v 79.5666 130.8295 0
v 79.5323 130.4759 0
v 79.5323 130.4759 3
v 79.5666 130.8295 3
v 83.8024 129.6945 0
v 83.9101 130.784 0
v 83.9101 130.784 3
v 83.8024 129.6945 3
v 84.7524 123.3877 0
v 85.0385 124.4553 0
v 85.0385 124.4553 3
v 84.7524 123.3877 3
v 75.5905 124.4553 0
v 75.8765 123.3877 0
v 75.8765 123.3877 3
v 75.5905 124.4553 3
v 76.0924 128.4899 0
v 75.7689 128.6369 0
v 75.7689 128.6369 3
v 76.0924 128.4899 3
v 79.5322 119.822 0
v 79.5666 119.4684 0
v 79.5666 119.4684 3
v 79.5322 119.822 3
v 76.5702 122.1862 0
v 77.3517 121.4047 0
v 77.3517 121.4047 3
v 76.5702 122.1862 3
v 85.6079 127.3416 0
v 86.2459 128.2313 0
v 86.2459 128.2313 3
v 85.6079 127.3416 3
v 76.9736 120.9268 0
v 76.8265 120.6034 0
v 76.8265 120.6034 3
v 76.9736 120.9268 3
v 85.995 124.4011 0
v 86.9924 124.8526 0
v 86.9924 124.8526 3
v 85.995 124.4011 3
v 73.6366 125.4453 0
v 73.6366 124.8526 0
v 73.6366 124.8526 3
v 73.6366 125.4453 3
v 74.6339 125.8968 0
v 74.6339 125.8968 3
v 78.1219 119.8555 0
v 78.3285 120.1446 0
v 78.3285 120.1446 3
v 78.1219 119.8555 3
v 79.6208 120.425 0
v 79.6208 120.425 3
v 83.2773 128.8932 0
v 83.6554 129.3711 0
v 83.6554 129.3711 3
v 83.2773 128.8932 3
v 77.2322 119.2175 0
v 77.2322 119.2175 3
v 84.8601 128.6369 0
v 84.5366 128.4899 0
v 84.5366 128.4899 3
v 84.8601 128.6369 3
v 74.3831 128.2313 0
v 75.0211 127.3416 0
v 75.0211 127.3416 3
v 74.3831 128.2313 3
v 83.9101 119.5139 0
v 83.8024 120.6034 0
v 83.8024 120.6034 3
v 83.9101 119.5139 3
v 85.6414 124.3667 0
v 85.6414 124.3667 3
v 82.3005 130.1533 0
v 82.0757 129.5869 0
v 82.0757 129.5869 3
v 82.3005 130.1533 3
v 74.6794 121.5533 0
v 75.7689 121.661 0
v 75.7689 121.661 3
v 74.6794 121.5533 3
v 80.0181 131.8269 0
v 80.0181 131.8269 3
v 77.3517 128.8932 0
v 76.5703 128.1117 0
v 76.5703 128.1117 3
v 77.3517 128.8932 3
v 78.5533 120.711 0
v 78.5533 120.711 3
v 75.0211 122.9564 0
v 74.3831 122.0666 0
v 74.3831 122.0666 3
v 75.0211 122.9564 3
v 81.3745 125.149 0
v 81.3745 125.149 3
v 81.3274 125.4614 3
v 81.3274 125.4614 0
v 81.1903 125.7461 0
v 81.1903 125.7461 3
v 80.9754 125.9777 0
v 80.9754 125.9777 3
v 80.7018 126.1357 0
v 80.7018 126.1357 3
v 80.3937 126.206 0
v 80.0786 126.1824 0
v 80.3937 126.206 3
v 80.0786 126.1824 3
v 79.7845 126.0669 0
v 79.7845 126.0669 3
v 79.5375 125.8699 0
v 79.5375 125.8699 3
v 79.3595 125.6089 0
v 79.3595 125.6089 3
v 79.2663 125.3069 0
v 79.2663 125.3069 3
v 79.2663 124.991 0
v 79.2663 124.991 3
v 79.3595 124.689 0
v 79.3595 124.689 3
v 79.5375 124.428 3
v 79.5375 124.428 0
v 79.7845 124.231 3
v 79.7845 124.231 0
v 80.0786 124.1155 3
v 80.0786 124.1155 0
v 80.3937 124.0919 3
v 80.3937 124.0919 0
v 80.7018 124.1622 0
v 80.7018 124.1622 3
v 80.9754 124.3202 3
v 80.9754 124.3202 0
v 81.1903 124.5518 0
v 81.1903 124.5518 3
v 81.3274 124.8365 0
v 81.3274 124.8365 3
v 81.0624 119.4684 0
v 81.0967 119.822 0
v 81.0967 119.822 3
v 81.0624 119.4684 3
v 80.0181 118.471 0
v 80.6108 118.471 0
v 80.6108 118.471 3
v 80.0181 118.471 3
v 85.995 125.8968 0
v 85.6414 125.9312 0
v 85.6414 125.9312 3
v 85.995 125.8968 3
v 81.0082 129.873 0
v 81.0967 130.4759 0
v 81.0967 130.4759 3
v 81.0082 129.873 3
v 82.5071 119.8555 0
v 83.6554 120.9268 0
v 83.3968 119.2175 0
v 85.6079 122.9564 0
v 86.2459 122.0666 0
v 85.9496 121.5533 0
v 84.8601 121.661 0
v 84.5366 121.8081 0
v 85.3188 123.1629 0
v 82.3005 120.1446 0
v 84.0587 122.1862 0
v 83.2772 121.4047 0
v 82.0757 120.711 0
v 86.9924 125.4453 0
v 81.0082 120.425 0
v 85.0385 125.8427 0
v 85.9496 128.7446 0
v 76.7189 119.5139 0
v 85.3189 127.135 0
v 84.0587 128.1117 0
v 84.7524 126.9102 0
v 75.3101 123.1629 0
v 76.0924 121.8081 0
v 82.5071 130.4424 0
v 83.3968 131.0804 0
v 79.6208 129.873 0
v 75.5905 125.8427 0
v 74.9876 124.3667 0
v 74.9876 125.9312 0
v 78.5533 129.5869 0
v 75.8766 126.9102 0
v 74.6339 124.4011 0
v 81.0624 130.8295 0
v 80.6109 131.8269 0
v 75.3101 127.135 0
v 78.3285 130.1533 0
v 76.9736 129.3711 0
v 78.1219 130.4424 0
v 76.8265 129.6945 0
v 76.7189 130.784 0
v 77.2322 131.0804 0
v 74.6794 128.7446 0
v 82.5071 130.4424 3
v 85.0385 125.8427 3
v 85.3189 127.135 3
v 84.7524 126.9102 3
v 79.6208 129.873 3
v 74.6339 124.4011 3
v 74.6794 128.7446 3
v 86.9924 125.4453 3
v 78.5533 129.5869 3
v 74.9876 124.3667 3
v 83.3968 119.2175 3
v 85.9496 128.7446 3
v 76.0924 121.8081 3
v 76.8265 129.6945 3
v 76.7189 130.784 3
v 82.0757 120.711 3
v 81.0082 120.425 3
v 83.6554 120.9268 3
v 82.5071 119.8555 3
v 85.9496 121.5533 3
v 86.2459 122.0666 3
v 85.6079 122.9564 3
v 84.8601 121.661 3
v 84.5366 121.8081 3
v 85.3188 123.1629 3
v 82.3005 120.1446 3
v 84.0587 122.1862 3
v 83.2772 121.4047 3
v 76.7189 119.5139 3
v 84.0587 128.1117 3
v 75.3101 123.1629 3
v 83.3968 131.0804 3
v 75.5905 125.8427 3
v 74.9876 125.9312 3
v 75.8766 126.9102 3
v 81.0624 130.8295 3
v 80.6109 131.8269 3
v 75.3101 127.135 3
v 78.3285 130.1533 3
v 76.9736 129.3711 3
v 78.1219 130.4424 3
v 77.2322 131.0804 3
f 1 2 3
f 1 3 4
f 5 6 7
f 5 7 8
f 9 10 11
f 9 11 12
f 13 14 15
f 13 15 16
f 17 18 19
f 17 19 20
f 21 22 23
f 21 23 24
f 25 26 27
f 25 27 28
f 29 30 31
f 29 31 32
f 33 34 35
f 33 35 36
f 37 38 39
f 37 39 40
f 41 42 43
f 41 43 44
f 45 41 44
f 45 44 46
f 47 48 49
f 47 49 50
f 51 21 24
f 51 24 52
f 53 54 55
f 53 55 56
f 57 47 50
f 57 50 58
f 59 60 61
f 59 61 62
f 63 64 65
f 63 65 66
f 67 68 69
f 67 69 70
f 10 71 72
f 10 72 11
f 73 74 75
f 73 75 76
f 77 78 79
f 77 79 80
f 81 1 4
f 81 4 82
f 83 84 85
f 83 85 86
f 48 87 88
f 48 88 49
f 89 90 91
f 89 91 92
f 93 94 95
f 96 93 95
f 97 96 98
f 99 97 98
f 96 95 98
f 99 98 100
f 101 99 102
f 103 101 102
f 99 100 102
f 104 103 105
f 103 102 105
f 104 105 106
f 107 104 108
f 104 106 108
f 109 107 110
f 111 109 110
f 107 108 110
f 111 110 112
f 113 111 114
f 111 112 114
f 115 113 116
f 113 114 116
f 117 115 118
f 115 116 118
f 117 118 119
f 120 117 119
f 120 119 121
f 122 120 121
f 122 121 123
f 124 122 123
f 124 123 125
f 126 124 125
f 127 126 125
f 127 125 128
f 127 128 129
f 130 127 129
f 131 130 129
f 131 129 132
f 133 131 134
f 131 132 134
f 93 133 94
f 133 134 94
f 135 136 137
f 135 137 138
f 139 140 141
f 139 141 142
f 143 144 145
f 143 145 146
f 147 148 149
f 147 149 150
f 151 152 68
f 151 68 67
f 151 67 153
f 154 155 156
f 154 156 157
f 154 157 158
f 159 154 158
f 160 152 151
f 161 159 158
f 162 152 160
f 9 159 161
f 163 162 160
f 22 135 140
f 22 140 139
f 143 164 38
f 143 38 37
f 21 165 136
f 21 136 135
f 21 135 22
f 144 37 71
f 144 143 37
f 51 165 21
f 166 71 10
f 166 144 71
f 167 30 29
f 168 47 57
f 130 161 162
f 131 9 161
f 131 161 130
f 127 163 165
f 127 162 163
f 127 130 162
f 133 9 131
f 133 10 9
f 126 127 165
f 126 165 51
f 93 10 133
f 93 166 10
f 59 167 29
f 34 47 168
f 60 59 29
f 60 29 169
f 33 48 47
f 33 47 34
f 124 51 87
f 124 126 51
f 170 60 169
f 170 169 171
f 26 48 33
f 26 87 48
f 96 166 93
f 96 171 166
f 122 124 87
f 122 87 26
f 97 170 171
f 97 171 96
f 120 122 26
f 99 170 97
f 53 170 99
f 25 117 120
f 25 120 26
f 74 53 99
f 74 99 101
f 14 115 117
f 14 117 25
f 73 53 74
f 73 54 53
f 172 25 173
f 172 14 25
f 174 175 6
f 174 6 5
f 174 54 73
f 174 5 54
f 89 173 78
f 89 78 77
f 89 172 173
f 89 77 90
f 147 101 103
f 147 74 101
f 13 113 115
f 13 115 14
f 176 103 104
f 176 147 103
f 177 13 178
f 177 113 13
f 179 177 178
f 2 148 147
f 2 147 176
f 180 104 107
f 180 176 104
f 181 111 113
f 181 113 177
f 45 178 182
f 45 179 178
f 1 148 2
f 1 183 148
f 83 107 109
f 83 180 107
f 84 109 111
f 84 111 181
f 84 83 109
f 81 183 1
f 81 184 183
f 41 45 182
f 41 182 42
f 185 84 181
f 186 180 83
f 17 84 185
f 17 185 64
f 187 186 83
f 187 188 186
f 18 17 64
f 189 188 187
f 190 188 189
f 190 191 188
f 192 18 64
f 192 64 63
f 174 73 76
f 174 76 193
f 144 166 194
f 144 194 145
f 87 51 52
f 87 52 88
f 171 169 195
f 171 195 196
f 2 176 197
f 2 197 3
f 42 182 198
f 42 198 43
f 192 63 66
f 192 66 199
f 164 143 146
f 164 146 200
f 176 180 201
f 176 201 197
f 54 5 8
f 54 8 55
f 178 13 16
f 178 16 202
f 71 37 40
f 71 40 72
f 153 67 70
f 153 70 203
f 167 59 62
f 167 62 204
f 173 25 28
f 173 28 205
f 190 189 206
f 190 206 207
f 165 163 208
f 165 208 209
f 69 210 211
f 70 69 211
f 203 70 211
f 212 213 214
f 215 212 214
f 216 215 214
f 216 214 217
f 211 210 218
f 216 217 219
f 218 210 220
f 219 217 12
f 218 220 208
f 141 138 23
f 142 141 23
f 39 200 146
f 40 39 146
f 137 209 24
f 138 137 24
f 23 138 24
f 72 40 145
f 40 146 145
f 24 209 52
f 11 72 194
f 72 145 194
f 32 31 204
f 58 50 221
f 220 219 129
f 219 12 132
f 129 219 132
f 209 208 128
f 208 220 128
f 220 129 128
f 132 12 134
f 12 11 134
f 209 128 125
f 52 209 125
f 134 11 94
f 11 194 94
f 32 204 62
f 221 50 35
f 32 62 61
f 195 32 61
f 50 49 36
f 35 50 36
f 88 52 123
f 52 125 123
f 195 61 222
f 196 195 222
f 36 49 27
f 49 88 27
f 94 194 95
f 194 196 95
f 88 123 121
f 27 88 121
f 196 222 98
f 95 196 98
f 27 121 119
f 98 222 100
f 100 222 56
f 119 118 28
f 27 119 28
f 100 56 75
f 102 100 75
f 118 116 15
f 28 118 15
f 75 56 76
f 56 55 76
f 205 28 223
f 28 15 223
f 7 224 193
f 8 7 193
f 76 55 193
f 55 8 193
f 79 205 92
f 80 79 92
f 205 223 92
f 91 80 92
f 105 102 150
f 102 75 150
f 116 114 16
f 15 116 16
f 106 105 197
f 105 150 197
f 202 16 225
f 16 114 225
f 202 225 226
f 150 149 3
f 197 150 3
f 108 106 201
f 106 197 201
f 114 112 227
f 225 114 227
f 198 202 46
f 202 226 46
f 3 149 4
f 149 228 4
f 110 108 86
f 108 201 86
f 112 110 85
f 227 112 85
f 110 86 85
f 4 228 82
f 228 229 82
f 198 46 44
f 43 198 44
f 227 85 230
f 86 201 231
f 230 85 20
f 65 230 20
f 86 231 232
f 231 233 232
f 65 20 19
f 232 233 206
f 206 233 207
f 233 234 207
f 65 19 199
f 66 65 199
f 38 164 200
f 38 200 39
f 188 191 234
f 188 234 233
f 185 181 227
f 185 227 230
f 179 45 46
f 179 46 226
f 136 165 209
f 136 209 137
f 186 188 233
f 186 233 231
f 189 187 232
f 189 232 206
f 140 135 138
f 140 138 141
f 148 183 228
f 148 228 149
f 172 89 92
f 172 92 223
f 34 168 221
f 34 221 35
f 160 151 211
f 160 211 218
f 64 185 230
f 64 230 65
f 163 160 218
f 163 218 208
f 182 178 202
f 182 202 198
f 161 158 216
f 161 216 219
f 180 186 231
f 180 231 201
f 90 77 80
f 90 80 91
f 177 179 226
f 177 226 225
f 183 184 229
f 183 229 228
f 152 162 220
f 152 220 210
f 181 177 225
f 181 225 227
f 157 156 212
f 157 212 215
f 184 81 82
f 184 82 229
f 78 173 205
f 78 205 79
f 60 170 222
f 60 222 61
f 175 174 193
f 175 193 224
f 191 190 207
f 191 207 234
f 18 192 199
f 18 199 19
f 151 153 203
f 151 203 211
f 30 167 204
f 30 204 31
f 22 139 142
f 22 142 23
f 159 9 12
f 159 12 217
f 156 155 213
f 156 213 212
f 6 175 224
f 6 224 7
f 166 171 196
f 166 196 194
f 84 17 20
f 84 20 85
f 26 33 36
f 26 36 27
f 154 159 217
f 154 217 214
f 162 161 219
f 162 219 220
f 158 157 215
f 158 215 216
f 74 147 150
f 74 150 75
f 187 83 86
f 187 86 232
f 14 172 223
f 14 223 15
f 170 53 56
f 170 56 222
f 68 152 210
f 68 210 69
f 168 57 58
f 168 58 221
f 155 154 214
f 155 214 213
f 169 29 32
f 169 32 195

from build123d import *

# Parameters (mm, degrees)
BOSS_EXTRUDE1_DEPTH = 3
SKETCH2_R           = 1.06
CUT_EXTRUDE1_DEPTH  = 3


with BuildPart() as part:
    # Model → Boss-Extrude1 (new body)
    with BuildSketch(Plane.XY):
        Polygon((85.038482334, 125.842661122), (85.641402334, 125.931201122), (85.995047634, 125.896821579), (86.992422179, 125.445319522), (86.992422179, 124.852599522), (85.995047634, 124.401097464), (85.641402334, 124.366717921), (85.038482334, 124.455257921), (84.752432117, 123.387727108), (85.31884426, 123.162940226), (85.607924576, 122.95635), (86.245924576, 122.06665), (85.949564326, 121.553339567), (84.86006114, 121.661009882), (84.536608908, 121.80806635), (84.058733602, 122.186202635), (83.277245674, 121.404714707), (83.65538196, 120.926839402), (83.802438428, 120.60338717), (83.910108743, 119.513883983), (83.39679831, 119.217523733), (82.50709831, 119.855523733), (82.300508083, 120.14460405), (82.075721201, 120.711016193), (81.008190388, 120.424965975), (81.096730388, 119.822045975), (81.062350845, 119.468400675), (80.610848788, 118.471026131), (80.018128788, 118.471026131), (79.566626731, 119.468400675), (79.532247188, 119.822045975), (79.620787188, 120.424965975), (78.553256375, 120.711016193), (78.328469493, 120.14460405), (78.121879267, 119.855523733), (77.232179267, 119.217523733), (76.718868834, 119.513883983), (76.826539148, 120.60338717), (76.973595617, 120.926839402), (77.351731902, 121.404714707), (76.570243974, 122.186202635), (76.092368668, 121.80806635), (75.768916436, 121.661009882), (74.67941325, 121.553339567), (74.383053, 122.06665), (75.021053, 122.95635), (75.310133317, 123.162940226), (75.87654546, 123.387727108), (75.590503, 124.45526), (74.987583, 124.36672), (74.633937545, 124.401097943), (73.636563, 124.8526), (73.636563, 125.44532), (74.633937545, 125.896822057), (74.987582844, 125.9312016), (75.590502844, 125.8426616), (75.876553062, 126.910192413), (75.310140919, 127.134979295), (75.021060603, 127.341569522), (74.383060603, 128.231269522), (74.679420853, 128.744579955), (75.768924039, 128.63690964), (76.092376271, 128.489853171), (76.570251576, 128.111716886), (77.351739505, 128.893204814), (76.973603219, 129.37108012), (76.826546751, 129.694532352), (76.718876436, 130.784035538), (77.232186869, 131.080395788), (78.121886869, 130.442395788), (78.328477095, 130.153315471), (78.553263977, 129.586903328), (79.62079479, 129.872953546), (79.53225479, 130.475873546), (79.566634333, 130.829518846), (80.018136391, 131.826893391), (80.610856391, 131.826893391), (81.062358448, 130.829518846), (81.096737991, 130.475873546), (81.008197991, 129.872953546), (82.075728804, 129.586903328), (82.300515686, 130.153315471), (82.507105912, 130.442395788), (83.396805912, 131.080395788), (83.910116345, 130.784035538), (83.80244603, 129.694532352), (83.655389562, 129.37108012), (83.277253277, 128.893204814), (84.058741205, 128.111716886), (84.536616511, 128.489853171), (84.860068742, 128.63690964), (85.949571929, 128.744579955), (86.245932179, 128.231269522), (85.607932179, 127.341569522), (85.318851862, 127.134979295), (84.75243916, 126.910193822), align=None)
    extrude(amount=BOSS_EXTRUDE1_DEPTH)

    # Sketch2 → Cut-Extrude1 (cut)
    with BuildSketch(Plane.XY.offset(3)):
        with Locations((80.314492489, 125.148960513)):
            Circle(SKETCH2_R)
    extrude(amount=-CUT_EXTRUDE1_DEPTH, mode=Mode.SUBTRACT)


solid = part.part
